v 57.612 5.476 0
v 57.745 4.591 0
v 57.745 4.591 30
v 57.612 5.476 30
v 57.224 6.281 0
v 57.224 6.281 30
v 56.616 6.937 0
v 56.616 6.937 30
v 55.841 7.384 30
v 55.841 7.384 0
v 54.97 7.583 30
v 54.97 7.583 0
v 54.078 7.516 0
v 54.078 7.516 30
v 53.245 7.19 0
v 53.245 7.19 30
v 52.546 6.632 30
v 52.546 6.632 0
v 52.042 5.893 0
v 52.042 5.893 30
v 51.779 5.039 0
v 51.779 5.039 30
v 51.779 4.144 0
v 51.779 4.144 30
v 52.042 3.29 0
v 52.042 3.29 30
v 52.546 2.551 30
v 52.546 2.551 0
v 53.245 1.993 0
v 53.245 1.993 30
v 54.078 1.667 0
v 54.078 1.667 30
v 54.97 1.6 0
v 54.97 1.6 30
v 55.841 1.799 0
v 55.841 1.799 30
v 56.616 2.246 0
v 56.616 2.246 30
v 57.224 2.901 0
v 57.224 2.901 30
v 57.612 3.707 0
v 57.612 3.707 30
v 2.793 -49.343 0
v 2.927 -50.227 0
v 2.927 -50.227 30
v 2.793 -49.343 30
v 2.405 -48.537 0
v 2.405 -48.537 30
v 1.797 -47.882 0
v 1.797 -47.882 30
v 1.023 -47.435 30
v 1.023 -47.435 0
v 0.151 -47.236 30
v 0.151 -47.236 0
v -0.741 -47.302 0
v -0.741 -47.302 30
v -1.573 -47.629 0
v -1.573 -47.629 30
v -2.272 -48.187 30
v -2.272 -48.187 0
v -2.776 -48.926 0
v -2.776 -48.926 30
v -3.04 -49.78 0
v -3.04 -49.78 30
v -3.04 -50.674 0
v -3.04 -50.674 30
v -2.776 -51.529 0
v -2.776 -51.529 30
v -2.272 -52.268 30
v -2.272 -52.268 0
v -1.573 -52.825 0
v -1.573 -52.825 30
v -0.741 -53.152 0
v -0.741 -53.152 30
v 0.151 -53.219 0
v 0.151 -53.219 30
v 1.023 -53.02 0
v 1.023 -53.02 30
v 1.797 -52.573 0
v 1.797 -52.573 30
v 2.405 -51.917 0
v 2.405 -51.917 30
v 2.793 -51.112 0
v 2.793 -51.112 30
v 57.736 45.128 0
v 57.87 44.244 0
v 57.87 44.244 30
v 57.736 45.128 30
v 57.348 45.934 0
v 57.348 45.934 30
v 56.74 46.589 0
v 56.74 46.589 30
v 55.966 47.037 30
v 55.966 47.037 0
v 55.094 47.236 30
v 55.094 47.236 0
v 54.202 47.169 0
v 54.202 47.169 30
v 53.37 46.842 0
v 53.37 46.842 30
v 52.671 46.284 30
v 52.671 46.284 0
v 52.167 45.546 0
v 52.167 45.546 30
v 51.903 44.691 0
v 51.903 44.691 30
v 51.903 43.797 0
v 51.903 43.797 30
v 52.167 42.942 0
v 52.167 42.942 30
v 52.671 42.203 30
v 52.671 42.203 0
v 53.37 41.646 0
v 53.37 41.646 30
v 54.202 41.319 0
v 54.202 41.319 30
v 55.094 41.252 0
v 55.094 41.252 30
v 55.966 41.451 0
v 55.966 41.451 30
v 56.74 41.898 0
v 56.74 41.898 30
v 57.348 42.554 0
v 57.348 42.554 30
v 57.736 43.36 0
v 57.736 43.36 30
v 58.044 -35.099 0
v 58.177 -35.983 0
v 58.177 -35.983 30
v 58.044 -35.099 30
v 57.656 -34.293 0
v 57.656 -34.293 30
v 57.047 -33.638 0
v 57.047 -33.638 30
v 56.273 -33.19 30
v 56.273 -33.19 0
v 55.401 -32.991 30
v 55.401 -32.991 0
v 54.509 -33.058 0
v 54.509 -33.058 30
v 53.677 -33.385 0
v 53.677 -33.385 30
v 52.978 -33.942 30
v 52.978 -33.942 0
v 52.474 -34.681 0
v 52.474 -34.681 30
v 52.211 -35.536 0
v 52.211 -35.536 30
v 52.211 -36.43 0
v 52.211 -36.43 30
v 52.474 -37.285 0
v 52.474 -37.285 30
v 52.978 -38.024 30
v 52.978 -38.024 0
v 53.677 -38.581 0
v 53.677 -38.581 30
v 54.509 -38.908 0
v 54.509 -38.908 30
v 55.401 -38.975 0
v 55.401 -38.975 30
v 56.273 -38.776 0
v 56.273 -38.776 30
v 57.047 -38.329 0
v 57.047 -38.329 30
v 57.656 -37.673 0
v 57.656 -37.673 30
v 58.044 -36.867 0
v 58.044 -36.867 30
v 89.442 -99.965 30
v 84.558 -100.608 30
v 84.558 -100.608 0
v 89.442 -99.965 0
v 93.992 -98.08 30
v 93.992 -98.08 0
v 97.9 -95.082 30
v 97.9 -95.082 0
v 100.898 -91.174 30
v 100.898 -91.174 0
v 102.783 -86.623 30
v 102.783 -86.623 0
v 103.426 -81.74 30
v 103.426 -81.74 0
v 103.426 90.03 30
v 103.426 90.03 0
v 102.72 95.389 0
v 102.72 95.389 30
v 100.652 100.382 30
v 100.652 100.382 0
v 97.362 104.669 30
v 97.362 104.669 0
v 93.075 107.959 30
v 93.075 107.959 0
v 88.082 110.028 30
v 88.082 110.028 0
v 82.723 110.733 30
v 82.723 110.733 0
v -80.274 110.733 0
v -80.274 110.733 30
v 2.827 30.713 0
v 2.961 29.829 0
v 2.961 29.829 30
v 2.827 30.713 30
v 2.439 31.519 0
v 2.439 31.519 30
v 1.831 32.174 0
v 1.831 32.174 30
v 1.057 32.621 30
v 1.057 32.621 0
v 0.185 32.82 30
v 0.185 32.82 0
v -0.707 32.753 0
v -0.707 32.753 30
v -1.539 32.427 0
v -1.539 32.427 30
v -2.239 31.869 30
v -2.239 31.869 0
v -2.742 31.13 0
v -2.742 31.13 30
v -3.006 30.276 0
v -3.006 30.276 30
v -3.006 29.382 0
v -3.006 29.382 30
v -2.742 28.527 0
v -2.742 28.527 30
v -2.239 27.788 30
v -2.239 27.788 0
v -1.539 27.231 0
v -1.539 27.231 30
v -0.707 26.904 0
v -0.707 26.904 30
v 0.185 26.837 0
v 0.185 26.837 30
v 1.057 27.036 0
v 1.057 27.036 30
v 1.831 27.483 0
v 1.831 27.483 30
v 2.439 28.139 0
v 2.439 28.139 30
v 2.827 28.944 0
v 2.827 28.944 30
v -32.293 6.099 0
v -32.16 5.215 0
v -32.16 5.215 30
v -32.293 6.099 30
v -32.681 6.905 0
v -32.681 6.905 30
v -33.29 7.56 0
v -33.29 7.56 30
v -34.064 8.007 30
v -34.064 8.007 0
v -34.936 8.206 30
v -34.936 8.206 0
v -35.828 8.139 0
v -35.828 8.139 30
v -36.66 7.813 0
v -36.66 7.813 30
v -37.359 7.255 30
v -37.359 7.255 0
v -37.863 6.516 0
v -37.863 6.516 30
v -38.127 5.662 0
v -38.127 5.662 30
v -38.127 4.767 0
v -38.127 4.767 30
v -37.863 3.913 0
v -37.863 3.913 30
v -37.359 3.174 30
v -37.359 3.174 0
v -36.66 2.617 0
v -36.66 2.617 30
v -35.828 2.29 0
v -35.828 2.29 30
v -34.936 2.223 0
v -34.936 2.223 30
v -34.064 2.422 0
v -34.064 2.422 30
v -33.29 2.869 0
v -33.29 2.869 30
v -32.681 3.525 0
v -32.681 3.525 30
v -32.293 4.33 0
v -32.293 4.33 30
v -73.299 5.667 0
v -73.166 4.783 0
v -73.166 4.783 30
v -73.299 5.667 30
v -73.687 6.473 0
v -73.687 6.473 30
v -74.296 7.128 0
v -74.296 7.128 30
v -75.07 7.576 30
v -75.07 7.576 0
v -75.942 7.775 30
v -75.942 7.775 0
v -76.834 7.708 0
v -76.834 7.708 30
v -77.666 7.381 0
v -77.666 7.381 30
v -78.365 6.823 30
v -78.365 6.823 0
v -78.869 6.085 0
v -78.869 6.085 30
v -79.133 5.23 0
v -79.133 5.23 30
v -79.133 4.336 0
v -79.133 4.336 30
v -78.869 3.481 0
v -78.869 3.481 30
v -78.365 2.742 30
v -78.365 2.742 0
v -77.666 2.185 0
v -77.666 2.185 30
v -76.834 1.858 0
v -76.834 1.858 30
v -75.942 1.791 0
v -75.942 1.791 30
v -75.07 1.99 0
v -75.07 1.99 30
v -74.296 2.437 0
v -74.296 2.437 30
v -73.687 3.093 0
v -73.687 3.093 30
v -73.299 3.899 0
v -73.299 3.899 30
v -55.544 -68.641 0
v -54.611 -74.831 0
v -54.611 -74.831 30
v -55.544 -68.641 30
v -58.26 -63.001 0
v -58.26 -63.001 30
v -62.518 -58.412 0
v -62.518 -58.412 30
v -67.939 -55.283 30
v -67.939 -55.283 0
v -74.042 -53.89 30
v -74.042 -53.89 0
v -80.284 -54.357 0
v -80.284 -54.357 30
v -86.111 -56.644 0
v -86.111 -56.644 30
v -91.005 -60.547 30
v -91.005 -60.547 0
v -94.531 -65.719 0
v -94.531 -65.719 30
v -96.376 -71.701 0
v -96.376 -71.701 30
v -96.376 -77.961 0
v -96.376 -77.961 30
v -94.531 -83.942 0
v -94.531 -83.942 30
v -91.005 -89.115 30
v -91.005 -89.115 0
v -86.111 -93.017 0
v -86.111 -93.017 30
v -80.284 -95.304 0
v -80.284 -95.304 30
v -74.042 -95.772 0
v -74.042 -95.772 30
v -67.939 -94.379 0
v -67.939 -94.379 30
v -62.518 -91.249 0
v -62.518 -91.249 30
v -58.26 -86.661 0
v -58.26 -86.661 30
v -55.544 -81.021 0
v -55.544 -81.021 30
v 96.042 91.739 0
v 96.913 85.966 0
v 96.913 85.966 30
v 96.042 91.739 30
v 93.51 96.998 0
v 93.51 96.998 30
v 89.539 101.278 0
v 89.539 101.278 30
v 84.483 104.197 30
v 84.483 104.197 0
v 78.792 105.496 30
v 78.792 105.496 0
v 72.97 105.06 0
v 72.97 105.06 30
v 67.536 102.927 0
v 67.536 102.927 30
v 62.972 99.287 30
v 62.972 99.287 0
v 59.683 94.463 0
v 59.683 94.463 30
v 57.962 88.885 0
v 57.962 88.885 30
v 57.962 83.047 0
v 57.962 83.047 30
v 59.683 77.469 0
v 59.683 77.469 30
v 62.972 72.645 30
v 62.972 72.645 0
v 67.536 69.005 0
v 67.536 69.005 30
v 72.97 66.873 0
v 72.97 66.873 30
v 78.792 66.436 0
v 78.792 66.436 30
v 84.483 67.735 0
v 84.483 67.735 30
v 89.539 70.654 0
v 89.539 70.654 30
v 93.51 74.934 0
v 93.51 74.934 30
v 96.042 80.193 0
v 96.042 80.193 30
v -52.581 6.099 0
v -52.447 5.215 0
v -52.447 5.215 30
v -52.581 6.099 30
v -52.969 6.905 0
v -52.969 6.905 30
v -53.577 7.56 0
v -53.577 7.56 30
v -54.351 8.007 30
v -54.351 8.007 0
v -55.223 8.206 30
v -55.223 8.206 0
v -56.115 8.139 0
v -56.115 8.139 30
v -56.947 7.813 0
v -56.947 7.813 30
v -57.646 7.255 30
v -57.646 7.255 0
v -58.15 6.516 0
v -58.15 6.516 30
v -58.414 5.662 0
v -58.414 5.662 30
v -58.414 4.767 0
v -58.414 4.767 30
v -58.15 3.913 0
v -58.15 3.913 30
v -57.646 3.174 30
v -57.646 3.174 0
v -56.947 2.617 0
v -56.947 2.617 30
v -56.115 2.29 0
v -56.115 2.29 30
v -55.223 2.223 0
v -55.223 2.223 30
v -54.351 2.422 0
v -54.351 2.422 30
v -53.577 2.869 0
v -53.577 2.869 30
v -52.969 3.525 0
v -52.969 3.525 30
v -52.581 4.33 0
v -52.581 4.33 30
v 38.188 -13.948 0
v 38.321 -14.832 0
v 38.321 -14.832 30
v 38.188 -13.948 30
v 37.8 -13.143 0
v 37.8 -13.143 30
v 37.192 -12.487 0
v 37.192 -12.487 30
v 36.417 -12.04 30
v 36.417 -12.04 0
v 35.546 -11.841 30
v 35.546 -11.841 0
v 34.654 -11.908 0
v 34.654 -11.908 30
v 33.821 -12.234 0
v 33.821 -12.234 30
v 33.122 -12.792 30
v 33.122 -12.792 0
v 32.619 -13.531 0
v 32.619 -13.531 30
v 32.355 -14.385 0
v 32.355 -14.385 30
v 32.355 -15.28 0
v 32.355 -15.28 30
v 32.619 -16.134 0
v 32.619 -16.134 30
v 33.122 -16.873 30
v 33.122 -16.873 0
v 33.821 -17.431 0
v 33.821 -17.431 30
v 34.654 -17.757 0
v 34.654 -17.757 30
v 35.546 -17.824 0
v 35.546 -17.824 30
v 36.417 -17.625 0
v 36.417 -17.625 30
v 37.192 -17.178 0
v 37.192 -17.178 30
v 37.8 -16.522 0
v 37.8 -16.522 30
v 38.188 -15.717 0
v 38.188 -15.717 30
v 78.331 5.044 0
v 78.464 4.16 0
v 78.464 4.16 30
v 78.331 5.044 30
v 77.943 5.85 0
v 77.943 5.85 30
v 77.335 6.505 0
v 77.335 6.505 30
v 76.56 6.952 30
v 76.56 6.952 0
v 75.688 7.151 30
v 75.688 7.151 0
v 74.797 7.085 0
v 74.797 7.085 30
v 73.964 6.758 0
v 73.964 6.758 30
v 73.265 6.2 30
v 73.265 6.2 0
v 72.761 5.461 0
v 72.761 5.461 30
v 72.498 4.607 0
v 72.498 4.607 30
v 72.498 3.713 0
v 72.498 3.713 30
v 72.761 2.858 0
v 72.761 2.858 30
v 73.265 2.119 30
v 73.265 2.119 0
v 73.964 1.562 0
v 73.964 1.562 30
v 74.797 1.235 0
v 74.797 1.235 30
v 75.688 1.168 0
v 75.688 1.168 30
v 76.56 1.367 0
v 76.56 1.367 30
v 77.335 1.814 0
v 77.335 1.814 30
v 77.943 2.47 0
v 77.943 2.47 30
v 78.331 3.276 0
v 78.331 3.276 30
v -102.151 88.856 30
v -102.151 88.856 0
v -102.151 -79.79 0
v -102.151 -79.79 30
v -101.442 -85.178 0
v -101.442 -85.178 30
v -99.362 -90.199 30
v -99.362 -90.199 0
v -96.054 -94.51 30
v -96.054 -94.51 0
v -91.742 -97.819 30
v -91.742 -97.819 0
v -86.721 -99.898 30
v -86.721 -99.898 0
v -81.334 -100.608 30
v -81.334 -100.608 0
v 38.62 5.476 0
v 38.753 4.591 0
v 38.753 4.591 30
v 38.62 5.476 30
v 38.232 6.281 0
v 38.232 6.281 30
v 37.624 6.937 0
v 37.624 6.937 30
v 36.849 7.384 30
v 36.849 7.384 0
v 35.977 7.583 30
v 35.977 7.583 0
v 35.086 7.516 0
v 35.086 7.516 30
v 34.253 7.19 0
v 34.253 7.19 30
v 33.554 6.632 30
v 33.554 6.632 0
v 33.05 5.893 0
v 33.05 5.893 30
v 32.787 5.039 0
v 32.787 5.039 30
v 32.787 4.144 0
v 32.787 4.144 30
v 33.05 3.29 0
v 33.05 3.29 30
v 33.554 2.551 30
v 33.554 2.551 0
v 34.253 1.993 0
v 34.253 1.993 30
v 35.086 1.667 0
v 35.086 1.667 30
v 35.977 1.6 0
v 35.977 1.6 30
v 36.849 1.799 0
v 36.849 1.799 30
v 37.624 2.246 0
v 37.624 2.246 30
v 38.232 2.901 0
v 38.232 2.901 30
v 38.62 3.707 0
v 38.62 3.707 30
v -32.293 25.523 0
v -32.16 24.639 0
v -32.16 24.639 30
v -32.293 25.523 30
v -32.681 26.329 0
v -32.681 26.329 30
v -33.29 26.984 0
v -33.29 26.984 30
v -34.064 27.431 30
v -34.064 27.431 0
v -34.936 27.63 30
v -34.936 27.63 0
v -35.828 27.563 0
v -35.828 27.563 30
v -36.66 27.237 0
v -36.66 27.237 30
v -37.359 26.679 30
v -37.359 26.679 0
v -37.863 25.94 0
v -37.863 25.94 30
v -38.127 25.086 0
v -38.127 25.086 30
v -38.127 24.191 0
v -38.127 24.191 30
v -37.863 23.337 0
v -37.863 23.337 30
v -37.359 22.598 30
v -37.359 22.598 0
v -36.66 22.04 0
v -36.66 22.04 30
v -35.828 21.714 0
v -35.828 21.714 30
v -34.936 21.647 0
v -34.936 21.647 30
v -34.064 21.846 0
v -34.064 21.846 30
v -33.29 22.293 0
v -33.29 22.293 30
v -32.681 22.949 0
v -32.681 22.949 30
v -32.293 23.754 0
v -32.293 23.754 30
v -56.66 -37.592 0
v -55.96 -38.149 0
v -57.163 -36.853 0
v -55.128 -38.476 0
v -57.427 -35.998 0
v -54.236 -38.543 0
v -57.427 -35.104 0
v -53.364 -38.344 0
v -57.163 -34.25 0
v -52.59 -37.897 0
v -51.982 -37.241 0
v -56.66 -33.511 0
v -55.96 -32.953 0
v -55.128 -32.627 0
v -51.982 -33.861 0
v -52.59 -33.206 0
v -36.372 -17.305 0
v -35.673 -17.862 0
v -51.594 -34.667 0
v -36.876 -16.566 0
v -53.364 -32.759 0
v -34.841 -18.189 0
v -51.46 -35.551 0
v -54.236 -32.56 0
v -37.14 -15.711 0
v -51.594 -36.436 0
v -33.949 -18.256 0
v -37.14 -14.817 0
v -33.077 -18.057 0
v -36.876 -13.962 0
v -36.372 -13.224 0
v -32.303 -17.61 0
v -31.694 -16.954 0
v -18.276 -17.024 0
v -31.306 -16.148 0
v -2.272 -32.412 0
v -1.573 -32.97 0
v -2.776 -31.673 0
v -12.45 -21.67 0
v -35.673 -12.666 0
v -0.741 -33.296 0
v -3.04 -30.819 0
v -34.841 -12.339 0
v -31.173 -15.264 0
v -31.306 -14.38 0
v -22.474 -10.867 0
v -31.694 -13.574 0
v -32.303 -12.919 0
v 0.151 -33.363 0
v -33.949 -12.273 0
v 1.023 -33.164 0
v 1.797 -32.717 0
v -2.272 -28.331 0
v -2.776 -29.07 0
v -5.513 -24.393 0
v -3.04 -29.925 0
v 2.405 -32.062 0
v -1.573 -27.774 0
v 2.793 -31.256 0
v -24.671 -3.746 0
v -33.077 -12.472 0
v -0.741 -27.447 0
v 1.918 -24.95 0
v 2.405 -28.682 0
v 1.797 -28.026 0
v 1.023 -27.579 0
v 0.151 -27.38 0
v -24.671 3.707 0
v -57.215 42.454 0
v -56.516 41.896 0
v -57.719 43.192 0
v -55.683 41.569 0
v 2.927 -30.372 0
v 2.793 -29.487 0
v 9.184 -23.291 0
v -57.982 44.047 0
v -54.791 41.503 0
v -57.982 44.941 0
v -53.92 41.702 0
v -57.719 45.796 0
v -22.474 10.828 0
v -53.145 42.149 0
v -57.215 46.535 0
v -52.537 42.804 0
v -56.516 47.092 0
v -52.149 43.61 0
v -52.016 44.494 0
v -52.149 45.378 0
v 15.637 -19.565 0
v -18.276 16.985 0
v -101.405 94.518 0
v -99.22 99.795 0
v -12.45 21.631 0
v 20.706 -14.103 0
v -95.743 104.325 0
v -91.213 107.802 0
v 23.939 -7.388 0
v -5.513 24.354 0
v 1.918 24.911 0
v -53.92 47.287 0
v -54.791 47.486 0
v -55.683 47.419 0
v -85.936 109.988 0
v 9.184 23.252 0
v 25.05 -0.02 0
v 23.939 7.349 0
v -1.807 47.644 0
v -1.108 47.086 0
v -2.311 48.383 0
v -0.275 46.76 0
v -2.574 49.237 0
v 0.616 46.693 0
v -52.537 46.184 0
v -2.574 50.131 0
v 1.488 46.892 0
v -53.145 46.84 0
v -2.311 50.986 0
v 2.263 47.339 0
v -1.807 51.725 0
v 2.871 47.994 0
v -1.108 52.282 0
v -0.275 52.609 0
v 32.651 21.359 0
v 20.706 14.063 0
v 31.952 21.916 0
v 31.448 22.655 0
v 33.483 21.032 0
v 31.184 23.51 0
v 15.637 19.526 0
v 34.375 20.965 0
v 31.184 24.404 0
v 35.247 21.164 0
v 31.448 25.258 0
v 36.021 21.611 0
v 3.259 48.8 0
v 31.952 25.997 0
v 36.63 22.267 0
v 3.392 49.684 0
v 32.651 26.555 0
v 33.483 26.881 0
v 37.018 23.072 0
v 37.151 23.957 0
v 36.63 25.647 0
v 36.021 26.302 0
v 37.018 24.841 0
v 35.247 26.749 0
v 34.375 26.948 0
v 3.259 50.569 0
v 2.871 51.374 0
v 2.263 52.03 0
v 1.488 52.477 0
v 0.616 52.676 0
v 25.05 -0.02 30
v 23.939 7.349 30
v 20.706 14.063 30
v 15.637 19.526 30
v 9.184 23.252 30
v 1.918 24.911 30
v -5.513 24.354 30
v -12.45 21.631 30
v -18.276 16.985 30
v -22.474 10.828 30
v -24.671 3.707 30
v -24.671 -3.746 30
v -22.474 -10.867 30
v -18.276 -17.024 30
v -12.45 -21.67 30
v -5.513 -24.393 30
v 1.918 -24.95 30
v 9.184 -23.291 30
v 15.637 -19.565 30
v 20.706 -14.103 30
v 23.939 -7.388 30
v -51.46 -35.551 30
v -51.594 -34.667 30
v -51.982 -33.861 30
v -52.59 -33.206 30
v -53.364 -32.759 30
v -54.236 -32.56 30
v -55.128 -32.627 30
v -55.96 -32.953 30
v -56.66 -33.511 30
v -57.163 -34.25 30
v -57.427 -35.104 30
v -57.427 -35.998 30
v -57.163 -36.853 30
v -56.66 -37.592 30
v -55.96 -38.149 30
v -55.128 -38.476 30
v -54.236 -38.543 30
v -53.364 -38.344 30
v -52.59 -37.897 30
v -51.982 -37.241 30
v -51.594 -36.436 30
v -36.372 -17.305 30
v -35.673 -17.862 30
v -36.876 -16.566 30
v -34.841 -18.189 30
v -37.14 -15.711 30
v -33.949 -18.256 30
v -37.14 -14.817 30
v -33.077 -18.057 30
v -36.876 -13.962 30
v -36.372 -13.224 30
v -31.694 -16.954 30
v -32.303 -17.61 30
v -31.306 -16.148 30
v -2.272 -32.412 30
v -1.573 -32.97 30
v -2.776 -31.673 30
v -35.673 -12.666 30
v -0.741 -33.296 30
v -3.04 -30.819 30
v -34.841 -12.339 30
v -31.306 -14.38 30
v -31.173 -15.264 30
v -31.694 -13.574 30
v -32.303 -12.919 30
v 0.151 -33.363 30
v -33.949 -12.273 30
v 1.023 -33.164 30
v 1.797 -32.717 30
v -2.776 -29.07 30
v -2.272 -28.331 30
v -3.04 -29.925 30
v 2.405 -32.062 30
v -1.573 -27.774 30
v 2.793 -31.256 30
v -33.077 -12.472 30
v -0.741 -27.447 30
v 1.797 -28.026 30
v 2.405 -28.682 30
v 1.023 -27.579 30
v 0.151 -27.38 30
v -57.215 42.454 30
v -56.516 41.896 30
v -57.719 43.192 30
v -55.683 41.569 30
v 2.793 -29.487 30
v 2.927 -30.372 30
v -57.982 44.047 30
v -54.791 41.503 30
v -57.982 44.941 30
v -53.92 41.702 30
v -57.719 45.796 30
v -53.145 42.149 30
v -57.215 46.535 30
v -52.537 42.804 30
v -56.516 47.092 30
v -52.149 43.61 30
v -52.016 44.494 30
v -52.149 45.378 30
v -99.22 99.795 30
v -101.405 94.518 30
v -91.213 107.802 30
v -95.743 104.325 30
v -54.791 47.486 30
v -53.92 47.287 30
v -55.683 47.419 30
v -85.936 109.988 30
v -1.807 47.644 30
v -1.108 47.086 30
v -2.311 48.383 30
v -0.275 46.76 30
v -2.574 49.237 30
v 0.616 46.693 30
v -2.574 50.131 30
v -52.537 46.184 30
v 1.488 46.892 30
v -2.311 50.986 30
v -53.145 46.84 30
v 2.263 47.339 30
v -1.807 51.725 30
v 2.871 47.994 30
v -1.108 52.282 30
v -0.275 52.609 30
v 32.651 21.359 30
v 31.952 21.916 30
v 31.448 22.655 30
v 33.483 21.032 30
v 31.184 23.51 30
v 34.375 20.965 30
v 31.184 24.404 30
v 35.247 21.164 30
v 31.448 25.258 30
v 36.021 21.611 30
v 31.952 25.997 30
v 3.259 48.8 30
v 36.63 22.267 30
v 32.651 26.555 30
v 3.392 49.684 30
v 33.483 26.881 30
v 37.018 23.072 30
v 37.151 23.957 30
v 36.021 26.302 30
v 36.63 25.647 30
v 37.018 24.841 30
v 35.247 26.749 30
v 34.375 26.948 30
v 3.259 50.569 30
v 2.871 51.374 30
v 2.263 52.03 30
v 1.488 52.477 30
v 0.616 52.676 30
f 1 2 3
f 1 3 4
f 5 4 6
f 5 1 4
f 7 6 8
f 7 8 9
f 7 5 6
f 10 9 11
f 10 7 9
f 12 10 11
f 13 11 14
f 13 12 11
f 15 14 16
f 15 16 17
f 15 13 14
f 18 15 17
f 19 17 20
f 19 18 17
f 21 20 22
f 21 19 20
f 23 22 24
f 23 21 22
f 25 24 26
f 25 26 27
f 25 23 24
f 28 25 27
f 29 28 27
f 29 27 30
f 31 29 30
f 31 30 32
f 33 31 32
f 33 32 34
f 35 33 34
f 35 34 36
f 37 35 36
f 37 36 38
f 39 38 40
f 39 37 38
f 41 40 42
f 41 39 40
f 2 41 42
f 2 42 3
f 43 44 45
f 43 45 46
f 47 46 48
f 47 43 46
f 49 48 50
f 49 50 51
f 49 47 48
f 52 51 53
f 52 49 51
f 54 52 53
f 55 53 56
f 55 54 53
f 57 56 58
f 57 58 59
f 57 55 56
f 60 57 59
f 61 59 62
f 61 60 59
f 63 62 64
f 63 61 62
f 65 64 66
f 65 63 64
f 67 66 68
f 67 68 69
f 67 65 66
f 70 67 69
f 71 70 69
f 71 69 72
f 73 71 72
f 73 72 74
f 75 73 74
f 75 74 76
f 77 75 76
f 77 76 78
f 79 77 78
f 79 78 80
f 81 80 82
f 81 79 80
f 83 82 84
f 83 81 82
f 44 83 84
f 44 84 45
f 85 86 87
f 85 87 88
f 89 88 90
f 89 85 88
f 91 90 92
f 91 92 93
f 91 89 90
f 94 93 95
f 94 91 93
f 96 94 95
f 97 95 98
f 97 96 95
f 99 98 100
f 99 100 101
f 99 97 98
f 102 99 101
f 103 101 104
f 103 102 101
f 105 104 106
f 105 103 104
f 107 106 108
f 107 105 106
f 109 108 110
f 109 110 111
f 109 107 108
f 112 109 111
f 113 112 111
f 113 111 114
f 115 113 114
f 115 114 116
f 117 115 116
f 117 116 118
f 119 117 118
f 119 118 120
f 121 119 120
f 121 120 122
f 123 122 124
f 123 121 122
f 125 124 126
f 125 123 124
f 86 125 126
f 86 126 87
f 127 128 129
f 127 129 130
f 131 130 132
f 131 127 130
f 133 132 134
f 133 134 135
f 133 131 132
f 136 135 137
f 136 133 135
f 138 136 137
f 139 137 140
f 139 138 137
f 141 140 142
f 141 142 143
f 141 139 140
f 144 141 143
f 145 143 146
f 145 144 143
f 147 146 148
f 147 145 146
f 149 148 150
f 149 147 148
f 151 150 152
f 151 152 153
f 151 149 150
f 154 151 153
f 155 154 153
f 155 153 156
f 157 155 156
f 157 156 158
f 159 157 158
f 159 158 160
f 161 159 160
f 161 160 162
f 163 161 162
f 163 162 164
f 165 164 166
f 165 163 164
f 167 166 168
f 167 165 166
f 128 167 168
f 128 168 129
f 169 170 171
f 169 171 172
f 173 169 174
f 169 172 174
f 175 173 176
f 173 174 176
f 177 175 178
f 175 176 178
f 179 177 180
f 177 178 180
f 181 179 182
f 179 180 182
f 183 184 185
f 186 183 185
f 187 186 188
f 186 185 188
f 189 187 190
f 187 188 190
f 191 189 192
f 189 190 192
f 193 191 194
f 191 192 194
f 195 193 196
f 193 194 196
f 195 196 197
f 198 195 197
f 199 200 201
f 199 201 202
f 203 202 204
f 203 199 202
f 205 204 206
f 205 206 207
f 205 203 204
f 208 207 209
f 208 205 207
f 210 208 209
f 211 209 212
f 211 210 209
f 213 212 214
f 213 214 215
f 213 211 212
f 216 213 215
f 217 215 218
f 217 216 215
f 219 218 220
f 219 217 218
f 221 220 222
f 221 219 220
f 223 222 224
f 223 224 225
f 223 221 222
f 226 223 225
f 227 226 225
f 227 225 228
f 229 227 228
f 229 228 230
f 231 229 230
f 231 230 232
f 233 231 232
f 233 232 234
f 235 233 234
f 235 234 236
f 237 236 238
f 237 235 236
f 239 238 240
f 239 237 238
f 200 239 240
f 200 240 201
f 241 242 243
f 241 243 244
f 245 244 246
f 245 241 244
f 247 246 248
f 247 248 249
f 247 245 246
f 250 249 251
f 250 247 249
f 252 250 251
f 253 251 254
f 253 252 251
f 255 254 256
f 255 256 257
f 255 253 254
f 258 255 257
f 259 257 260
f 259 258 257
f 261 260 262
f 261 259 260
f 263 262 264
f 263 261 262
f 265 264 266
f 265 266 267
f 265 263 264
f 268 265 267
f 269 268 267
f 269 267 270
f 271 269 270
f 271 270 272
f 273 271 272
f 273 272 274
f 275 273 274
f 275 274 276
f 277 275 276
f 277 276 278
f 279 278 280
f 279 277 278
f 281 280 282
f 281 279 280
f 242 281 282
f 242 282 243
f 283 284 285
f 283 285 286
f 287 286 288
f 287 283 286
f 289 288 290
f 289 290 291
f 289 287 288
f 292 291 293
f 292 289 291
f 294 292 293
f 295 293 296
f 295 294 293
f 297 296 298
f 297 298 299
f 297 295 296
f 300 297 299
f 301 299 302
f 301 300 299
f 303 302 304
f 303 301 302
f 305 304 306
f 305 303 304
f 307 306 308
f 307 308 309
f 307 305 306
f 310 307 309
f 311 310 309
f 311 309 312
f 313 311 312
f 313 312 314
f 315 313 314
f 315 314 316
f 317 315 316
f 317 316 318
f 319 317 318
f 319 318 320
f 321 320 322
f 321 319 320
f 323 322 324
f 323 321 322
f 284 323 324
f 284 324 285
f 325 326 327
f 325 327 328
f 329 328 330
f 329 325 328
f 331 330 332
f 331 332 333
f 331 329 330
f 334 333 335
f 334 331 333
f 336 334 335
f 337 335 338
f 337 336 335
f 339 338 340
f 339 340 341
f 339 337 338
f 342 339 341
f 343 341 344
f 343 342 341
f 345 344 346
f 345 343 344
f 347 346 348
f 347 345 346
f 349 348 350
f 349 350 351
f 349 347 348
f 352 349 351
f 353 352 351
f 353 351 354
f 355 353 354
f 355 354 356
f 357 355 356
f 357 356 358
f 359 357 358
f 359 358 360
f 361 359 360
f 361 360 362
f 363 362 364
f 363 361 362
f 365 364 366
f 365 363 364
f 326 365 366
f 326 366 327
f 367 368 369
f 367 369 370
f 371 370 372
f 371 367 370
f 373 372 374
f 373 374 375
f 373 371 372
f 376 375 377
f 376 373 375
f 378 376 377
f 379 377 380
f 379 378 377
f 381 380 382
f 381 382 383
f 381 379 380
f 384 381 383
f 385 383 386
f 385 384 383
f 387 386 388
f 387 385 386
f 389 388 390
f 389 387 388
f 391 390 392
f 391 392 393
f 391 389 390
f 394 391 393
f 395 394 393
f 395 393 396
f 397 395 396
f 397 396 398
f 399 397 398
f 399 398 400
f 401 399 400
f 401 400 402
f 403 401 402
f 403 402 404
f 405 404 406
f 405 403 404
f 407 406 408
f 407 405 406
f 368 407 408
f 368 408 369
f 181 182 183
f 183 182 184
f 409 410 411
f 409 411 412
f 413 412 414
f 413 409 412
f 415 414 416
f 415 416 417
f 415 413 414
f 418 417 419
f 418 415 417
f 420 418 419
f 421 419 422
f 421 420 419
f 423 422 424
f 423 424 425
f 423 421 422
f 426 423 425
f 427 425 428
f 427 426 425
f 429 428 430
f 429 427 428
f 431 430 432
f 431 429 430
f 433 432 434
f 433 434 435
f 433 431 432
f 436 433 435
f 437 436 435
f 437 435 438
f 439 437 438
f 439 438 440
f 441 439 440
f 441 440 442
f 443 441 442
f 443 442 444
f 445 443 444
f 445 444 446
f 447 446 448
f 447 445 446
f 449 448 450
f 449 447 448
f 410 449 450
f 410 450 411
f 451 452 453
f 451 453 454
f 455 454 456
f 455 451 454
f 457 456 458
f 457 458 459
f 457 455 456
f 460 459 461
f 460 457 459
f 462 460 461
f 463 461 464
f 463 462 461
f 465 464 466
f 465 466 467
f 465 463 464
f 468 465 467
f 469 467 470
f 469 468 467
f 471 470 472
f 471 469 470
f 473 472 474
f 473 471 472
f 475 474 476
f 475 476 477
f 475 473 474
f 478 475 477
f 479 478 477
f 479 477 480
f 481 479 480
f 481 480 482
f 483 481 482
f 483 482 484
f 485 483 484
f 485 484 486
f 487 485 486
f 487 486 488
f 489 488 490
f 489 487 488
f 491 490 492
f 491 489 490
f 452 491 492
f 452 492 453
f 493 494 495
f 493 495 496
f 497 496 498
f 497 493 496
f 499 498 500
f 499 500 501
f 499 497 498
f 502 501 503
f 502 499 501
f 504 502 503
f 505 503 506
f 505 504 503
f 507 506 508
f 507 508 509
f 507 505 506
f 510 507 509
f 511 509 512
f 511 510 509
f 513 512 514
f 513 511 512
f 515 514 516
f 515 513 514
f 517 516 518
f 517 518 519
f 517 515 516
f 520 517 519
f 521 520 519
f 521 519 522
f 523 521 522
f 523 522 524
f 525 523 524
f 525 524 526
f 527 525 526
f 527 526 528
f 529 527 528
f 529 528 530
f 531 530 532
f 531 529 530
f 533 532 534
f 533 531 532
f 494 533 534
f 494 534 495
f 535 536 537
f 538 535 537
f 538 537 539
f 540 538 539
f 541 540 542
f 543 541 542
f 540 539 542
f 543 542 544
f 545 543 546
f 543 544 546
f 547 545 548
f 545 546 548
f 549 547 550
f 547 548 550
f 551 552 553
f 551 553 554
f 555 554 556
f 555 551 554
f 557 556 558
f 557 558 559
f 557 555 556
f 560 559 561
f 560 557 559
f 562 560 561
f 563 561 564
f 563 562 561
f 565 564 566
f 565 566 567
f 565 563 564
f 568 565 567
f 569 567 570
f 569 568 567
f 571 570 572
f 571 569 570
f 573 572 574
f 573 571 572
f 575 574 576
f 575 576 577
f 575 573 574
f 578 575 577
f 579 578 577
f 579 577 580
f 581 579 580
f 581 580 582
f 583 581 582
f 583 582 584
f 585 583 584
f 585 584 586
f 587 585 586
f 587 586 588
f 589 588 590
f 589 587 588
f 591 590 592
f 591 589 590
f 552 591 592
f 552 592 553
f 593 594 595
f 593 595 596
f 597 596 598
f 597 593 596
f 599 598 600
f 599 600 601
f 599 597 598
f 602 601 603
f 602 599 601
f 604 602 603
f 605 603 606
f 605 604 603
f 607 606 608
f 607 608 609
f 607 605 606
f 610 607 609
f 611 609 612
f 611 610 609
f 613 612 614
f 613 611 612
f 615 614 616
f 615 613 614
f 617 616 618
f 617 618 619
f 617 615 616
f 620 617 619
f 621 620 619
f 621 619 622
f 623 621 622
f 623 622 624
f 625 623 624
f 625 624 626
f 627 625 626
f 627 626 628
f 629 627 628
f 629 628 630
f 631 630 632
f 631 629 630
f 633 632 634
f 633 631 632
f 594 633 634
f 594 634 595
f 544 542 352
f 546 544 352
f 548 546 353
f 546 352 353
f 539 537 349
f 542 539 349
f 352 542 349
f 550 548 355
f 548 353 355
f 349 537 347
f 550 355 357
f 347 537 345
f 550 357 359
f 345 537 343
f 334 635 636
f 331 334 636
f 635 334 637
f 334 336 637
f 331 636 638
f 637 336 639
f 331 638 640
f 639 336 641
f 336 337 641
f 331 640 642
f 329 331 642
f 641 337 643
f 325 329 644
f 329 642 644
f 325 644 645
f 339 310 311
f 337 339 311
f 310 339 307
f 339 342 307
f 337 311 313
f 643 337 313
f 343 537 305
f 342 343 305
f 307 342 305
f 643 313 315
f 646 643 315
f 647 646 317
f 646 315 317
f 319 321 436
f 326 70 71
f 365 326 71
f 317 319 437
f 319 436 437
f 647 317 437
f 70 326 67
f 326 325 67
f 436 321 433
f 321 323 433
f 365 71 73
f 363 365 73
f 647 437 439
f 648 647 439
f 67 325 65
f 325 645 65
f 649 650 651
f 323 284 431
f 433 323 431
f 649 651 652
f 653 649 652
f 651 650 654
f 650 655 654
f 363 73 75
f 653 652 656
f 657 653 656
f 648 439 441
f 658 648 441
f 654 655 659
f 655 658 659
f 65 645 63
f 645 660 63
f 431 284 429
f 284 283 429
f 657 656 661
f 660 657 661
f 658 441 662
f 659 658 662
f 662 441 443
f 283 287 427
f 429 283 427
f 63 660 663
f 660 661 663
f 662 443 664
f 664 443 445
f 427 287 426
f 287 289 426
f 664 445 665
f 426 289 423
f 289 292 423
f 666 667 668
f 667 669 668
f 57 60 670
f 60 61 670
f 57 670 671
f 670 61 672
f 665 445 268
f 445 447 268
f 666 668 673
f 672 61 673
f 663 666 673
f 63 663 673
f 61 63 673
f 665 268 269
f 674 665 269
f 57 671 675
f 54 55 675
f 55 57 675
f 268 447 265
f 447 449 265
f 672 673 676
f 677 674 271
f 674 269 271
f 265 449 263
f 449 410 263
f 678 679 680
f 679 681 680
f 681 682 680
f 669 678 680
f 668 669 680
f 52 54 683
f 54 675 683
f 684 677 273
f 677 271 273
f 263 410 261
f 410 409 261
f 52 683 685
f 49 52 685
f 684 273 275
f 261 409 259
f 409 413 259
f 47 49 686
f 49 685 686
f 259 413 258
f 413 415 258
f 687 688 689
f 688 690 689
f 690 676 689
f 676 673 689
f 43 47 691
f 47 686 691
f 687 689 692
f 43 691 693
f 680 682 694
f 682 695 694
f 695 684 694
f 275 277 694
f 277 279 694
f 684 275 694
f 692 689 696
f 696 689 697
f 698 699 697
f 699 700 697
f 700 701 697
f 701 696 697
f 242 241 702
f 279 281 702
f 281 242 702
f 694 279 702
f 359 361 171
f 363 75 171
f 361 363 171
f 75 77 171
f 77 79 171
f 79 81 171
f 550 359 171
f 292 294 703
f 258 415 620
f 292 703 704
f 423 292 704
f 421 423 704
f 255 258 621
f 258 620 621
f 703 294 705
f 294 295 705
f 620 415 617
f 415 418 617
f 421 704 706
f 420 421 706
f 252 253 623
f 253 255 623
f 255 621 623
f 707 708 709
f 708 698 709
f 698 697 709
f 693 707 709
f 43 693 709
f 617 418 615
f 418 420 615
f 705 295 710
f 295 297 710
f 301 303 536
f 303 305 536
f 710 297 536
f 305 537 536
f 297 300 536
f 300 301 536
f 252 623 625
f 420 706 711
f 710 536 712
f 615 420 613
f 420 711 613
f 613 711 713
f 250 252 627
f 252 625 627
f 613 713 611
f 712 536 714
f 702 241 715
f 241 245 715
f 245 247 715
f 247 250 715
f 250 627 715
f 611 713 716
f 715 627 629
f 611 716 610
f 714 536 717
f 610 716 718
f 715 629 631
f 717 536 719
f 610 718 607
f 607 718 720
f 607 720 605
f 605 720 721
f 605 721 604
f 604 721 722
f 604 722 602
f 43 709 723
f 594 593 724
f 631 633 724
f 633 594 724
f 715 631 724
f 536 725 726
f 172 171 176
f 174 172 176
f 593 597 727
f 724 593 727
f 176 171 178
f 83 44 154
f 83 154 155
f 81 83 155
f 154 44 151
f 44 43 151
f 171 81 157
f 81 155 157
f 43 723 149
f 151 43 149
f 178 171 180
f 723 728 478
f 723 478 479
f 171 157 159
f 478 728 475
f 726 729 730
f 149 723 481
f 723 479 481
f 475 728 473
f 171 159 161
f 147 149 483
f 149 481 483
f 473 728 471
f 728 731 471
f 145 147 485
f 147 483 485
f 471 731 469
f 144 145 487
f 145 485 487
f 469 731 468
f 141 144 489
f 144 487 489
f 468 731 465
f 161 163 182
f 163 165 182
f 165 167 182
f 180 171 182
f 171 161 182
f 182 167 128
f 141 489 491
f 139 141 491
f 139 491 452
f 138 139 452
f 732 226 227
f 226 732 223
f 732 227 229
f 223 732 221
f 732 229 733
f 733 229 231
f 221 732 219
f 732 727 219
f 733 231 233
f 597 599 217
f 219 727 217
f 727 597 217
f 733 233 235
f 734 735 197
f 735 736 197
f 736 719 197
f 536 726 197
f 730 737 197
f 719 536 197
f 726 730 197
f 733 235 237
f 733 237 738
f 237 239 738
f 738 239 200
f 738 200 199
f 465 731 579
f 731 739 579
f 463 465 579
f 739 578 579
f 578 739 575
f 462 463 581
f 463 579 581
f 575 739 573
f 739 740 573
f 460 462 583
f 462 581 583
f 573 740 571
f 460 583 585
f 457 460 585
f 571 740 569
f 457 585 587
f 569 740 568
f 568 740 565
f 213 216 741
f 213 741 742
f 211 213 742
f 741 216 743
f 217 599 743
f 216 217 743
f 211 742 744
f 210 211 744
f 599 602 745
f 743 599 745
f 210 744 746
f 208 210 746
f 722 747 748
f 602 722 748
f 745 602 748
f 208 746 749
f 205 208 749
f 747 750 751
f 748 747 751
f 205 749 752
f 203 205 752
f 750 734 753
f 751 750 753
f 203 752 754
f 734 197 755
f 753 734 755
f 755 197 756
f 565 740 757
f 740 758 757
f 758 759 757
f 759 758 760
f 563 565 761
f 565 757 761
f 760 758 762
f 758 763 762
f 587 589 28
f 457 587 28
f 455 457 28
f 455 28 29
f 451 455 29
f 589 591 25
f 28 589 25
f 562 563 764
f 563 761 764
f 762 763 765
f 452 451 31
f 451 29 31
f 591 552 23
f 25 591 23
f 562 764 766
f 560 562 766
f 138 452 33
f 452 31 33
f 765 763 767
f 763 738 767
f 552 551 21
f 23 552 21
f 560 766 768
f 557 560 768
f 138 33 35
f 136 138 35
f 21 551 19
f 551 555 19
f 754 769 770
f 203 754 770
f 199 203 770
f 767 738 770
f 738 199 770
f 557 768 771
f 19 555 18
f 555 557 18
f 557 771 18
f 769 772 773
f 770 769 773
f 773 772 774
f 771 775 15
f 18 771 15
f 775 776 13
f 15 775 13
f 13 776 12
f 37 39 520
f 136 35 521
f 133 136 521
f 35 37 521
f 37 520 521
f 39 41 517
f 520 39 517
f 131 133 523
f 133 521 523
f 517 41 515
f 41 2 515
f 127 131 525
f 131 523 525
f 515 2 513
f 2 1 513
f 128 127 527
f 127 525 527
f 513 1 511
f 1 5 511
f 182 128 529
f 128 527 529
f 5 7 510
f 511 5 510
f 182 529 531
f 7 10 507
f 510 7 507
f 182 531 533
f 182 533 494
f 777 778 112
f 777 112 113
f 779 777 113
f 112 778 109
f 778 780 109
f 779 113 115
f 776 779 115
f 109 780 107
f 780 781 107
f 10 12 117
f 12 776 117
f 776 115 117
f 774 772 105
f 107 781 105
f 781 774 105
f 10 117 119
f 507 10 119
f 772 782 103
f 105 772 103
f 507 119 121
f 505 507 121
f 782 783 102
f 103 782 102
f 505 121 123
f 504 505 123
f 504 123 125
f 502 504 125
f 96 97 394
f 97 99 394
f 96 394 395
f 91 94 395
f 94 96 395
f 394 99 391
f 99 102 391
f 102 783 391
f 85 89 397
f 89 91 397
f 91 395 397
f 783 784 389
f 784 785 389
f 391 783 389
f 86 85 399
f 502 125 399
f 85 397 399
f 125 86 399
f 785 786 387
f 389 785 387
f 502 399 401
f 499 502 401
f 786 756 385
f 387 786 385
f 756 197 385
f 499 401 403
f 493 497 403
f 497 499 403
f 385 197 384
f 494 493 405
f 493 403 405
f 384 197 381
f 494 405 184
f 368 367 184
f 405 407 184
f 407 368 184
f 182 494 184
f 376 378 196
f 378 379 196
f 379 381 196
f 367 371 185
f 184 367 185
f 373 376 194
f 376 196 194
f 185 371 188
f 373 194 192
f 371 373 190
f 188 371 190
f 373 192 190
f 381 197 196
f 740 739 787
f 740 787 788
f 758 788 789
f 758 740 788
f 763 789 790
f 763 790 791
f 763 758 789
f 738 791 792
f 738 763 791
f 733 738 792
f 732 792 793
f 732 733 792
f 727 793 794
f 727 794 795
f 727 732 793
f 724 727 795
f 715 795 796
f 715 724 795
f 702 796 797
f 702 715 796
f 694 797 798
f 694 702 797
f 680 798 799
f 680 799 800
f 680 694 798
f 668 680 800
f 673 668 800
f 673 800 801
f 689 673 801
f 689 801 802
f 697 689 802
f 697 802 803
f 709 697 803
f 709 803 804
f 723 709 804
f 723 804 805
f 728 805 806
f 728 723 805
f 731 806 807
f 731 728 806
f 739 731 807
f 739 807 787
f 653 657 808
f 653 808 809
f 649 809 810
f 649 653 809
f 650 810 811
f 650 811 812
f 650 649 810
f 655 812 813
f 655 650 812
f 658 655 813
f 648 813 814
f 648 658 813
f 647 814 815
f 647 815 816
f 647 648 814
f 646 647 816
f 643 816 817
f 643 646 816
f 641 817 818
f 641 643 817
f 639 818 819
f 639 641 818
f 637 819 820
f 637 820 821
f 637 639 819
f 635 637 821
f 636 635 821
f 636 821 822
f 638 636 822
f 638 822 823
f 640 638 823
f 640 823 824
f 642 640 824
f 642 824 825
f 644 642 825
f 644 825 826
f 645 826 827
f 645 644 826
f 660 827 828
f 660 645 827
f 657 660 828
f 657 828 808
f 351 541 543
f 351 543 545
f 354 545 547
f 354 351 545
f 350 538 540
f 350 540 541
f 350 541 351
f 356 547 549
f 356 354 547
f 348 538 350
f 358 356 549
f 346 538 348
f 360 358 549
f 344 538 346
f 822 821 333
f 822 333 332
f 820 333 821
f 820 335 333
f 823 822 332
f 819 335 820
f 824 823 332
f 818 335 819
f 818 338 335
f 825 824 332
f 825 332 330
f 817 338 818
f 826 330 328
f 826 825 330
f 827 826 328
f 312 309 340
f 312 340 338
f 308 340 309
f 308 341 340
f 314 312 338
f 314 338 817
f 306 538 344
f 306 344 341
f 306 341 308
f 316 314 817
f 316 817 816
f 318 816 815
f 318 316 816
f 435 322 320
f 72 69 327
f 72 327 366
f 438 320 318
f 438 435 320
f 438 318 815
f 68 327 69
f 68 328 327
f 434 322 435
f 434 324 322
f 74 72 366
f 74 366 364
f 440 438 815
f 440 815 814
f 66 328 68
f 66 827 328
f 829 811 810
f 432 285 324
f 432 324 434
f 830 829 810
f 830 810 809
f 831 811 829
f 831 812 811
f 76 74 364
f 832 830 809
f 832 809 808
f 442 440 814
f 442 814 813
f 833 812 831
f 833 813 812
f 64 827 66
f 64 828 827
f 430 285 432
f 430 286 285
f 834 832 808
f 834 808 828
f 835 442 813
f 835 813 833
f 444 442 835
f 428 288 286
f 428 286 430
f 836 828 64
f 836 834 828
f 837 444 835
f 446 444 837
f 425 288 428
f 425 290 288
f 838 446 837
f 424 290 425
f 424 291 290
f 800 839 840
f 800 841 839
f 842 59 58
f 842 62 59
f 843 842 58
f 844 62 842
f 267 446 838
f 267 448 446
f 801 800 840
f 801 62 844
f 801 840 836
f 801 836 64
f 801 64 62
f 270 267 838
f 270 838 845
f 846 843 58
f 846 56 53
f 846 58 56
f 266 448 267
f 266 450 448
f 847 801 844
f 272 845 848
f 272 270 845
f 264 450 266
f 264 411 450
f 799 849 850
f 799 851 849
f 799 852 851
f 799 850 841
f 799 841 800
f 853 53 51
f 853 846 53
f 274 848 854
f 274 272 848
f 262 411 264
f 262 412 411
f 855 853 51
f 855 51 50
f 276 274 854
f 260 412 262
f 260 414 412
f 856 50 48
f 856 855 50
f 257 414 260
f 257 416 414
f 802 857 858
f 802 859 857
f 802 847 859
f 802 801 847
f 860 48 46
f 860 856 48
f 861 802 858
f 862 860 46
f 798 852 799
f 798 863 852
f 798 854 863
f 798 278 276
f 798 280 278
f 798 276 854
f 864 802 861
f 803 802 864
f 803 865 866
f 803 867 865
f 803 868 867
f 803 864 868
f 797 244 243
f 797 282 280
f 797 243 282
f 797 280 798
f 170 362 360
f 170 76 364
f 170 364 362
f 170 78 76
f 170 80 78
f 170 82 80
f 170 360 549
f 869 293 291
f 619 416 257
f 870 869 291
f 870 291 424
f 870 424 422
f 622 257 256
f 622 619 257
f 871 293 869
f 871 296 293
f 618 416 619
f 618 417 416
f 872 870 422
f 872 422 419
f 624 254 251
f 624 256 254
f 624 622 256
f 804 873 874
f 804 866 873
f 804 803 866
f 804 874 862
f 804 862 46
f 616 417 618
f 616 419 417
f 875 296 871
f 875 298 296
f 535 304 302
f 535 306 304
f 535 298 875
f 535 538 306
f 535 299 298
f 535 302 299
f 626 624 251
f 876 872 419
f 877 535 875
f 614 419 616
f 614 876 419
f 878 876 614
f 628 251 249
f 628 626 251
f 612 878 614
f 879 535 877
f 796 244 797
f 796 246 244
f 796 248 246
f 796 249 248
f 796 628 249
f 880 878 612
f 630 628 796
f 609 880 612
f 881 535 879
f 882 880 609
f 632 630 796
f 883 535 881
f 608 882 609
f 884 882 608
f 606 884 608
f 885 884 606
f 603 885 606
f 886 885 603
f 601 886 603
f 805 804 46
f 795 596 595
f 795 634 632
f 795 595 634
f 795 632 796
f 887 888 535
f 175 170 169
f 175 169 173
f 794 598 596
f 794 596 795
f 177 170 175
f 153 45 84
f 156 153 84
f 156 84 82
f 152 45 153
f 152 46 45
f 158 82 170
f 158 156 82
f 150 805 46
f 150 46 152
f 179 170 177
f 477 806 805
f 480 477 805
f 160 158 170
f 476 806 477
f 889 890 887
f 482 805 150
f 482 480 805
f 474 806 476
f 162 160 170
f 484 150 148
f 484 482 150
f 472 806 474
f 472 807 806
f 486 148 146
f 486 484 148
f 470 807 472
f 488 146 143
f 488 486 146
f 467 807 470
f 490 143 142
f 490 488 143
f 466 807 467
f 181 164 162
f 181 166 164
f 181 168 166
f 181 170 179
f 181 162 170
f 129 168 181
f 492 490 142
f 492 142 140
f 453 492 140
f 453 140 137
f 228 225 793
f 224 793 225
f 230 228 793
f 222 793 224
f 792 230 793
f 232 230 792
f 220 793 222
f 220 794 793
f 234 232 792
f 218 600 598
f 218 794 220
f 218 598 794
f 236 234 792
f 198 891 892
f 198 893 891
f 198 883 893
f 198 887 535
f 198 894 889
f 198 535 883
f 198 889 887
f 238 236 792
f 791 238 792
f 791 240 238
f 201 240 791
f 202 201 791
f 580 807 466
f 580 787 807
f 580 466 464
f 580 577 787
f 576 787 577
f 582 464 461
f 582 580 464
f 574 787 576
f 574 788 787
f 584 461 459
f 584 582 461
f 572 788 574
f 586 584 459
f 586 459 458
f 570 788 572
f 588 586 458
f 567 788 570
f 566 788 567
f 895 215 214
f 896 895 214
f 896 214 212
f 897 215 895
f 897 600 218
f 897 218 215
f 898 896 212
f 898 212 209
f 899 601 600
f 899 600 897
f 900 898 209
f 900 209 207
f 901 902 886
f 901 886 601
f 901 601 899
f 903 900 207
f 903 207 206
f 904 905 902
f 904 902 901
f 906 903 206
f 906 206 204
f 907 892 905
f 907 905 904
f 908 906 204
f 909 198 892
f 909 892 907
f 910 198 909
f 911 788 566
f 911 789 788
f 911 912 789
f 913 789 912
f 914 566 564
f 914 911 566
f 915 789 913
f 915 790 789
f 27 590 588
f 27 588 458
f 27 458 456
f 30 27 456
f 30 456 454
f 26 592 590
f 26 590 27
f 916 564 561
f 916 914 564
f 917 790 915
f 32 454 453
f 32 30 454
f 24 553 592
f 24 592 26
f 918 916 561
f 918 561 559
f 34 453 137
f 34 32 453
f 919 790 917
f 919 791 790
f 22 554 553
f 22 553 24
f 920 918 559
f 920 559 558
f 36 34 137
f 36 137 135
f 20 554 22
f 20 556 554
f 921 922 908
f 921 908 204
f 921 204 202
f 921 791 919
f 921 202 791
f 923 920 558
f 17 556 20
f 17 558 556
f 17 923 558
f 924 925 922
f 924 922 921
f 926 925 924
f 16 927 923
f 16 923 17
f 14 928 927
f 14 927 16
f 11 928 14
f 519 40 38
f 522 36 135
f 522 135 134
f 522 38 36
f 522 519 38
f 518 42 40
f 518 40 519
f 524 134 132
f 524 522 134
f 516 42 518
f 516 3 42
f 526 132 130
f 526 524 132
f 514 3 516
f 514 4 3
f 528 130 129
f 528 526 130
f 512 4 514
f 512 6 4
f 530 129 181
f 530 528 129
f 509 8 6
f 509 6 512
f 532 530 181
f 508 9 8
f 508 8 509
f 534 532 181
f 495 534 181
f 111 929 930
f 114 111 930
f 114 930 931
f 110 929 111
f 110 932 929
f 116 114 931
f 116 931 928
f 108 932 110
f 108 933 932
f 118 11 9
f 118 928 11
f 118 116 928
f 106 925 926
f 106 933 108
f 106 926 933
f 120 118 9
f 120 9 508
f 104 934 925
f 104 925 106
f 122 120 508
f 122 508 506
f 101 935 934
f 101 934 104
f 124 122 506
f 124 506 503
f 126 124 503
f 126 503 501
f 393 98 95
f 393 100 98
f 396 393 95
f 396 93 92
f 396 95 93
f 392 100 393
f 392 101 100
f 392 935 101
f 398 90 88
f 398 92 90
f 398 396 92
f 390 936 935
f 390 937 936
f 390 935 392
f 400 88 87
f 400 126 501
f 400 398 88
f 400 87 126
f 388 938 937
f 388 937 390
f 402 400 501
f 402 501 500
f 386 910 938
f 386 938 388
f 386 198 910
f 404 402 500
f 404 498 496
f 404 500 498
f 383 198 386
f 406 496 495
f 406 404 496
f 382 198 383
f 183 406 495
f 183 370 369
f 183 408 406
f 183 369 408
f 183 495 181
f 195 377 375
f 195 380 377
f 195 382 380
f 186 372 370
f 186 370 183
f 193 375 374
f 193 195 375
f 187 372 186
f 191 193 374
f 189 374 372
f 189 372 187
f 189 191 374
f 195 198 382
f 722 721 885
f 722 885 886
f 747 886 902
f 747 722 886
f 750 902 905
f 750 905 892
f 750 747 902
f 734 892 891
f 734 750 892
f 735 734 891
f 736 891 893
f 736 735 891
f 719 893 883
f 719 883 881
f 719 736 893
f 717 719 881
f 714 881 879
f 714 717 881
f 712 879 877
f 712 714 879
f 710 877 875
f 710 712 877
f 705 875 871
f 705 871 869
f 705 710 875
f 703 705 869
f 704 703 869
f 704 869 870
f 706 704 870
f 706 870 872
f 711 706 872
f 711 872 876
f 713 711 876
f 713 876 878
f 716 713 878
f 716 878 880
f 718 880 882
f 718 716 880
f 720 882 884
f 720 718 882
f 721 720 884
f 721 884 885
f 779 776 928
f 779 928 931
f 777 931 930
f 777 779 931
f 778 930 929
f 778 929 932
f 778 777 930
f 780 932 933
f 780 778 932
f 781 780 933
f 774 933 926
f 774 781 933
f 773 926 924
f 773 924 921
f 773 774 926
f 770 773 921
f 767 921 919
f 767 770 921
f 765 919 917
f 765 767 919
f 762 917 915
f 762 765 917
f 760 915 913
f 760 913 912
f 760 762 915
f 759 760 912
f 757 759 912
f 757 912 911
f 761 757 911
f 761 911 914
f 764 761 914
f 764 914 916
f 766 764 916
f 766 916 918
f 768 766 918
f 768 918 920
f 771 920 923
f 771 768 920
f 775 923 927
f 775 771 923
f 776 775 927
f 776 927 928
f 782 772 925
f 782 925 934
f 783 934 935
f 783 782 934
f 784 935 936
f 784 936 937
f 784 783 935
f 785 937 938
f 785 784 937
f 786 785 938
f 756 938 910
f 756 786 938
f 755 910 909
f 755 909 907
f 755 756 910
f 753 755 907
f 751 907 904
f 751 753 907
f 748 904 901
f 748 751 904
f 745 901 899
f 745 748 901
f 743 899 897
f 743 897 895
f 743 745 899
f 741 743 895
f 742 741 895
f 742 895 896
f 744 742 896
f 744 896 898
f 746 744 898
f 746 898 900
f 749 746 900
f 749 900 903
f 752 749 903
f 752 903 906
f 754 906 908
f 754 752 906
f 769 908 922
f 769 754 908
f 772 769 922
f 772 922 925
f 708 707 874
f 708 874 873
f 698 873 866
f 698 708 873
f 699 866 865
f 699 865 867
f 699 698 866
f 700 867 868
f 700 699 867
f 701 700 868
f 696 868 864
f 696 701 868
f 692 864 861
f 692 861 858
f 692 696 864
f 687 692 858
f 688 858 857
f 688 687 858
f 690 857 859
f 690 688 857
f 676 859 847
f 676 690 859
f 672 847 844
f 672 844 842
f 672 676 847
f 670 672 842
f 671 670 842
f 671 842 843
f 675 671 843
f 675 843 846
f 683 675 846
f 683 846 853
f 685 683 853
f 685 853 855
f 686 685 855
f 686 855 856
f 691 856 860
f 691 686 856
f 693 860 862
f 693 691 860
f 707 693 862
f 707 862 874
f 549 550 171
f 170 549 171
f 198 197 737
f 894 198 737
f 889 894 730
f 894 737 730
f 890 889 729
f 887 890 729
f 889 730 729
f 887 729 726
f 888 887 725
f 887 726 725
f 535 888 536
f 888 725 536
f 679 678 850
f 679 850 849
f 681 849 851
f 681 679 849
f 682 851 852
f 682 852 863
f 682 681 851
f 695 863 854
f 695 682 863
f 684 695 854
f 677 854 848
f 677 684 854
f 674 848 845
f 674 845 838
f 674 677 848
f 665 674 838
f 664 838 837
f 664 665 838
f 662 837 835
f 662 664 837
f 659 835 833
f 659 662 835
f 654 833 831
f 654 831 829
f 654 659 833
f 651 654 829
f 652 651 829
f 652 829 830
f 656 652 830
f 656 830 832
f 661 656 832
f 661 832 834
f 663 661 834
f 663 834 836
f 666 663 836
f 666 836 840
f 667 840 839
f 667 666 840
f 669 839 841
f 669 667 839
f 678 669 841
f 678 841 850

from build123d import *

# Parameters (mm, degrees)
SKETCH_R   = 25
SKETCH_R_2 = 21
SKETCH_R_3 = 19.584537
SKETCH_R_4 = 3
PAD_DEPTH  = 30


with BuildPart() as part:
    # Sketch → Pad (new body)
    with BuildSketch(Plane.XY):
        with BuildLine():
            Line((-81.3335, -100.607731), (84.558204, -100.607731))
            ThreePointArc((84.558204, -100.607731), (97.89969, -95.081507), (103.425914, -81.740021))
            Line((103.425914, -81.740021), (103.425914, 90.030335))
            ThreePointArc((103.425914, 90.030335), (97.36226, 104.66929), (82.723305, 110.732944))
            Line((82.723305, 110.732944), (-80.274155, 110.732944))
            ThreePointArc((-80.274155, 110.732944), (-95.743365, 104.325387), (-102.150922, 88.856177))
            Line((-102.150922, 88.856177), (-102.150922, -79.790309))
            ThreePointArc((-102.150922, -79.790309), (-96.05364, -94.510449), (-81.3335, -100.607731))
        make_face()
        with Locations((0.050005, -0.019529)):
            Circle(SKETCH_R, mode=Mode.SUBTRACT)
        with Locations((-75.610901, -74.830917)):
            Circle(SKETCH_R_2, mode=Mode.SUBTRACT)
        with Locations((77.328041, 85.966019)):
            Circle(SKETCH_R_3, mode=Mode.SUBTRACT)
        with Locations((-35.160095, 24.638546)):
            Circle(SKETCH_R_4, mode=Mode.SUBTRACT)
        with Locations((-35.160095, 5.214603)):
            Circle(SKETCH_R_4, mode=Mode.SUBTRACT)
        with Locations((-55.447323, 5.214603)):
            Circle(SKETCH_R_4, mode=Mode.SUBTRACT)
        with Locations((-76.166206, 4.782958)):
            Circle(SKETCH_R_4, mode=Mode.SUBTRACT)
        with Locations((-55.015682, 44.494133)):
            Circle(SKETCH_R_4, mode=Mode.SUBTRACT)
        with Locations((-0.039441, 29.828697)):
            Circle(SKETCH_R_4, mode=Mode.SUBTRACT)
        with Locations((0.392204, 49.684288)):
            Circle(SKETCH_R_4, mode=Mode.SUBTRACT)
        with Locations((34.150871, 23.956688)):
            Circle(SKETCH_R_4, mode=Mode.SUBTRACT)
        with Locations((54.869728, 44.243923)):
            Circle(SKETCH_R_4, mode=Mode.SUBTRACT)
        with Locations((35.753071, 4.591456)):
            Circle(SKETCH_R_4, mode=Mode.SUBTRACT)
        with Locations((54.74538, 4.591456)):
            Circle(SKETCH_R_4, mode=Mode.SUBTRACT)
        with Locations((75.464256, 4.159811)):
            Circle(SKETCH_R_4, mode=Mode.SUBTRACT)
        with Locations((-34.173149, -15.264144)):
            Circle(SKETCH_R_4, mode=Mode.SUBTRACT)
        with Locations((-54.460381, -35.551373)):
            Circle(SKETCH_R_4, mode=Mode.SUBTRACT)
        with Locations((-0.073334, -30.371653)):
            Circle(SKETCH_R_4, mode=Mode.SUBTRACT)
        with Locations((-0.073334, -50.227249)):
            Circle(SKETCH_R_4, mode=Mode.SUBTRACT)
        with Locations((35.321426, -14.832499)):
            Circle(SKETCH_R_4, mode=Mode.SUBTRACT)
        with Locations((55.177025, -35.983017)):
            Circle(SKETCH_R_4, mode=Mode.SUBTRACT)
    extrude(amount=PAD_DEPTH)


solid = part.part
